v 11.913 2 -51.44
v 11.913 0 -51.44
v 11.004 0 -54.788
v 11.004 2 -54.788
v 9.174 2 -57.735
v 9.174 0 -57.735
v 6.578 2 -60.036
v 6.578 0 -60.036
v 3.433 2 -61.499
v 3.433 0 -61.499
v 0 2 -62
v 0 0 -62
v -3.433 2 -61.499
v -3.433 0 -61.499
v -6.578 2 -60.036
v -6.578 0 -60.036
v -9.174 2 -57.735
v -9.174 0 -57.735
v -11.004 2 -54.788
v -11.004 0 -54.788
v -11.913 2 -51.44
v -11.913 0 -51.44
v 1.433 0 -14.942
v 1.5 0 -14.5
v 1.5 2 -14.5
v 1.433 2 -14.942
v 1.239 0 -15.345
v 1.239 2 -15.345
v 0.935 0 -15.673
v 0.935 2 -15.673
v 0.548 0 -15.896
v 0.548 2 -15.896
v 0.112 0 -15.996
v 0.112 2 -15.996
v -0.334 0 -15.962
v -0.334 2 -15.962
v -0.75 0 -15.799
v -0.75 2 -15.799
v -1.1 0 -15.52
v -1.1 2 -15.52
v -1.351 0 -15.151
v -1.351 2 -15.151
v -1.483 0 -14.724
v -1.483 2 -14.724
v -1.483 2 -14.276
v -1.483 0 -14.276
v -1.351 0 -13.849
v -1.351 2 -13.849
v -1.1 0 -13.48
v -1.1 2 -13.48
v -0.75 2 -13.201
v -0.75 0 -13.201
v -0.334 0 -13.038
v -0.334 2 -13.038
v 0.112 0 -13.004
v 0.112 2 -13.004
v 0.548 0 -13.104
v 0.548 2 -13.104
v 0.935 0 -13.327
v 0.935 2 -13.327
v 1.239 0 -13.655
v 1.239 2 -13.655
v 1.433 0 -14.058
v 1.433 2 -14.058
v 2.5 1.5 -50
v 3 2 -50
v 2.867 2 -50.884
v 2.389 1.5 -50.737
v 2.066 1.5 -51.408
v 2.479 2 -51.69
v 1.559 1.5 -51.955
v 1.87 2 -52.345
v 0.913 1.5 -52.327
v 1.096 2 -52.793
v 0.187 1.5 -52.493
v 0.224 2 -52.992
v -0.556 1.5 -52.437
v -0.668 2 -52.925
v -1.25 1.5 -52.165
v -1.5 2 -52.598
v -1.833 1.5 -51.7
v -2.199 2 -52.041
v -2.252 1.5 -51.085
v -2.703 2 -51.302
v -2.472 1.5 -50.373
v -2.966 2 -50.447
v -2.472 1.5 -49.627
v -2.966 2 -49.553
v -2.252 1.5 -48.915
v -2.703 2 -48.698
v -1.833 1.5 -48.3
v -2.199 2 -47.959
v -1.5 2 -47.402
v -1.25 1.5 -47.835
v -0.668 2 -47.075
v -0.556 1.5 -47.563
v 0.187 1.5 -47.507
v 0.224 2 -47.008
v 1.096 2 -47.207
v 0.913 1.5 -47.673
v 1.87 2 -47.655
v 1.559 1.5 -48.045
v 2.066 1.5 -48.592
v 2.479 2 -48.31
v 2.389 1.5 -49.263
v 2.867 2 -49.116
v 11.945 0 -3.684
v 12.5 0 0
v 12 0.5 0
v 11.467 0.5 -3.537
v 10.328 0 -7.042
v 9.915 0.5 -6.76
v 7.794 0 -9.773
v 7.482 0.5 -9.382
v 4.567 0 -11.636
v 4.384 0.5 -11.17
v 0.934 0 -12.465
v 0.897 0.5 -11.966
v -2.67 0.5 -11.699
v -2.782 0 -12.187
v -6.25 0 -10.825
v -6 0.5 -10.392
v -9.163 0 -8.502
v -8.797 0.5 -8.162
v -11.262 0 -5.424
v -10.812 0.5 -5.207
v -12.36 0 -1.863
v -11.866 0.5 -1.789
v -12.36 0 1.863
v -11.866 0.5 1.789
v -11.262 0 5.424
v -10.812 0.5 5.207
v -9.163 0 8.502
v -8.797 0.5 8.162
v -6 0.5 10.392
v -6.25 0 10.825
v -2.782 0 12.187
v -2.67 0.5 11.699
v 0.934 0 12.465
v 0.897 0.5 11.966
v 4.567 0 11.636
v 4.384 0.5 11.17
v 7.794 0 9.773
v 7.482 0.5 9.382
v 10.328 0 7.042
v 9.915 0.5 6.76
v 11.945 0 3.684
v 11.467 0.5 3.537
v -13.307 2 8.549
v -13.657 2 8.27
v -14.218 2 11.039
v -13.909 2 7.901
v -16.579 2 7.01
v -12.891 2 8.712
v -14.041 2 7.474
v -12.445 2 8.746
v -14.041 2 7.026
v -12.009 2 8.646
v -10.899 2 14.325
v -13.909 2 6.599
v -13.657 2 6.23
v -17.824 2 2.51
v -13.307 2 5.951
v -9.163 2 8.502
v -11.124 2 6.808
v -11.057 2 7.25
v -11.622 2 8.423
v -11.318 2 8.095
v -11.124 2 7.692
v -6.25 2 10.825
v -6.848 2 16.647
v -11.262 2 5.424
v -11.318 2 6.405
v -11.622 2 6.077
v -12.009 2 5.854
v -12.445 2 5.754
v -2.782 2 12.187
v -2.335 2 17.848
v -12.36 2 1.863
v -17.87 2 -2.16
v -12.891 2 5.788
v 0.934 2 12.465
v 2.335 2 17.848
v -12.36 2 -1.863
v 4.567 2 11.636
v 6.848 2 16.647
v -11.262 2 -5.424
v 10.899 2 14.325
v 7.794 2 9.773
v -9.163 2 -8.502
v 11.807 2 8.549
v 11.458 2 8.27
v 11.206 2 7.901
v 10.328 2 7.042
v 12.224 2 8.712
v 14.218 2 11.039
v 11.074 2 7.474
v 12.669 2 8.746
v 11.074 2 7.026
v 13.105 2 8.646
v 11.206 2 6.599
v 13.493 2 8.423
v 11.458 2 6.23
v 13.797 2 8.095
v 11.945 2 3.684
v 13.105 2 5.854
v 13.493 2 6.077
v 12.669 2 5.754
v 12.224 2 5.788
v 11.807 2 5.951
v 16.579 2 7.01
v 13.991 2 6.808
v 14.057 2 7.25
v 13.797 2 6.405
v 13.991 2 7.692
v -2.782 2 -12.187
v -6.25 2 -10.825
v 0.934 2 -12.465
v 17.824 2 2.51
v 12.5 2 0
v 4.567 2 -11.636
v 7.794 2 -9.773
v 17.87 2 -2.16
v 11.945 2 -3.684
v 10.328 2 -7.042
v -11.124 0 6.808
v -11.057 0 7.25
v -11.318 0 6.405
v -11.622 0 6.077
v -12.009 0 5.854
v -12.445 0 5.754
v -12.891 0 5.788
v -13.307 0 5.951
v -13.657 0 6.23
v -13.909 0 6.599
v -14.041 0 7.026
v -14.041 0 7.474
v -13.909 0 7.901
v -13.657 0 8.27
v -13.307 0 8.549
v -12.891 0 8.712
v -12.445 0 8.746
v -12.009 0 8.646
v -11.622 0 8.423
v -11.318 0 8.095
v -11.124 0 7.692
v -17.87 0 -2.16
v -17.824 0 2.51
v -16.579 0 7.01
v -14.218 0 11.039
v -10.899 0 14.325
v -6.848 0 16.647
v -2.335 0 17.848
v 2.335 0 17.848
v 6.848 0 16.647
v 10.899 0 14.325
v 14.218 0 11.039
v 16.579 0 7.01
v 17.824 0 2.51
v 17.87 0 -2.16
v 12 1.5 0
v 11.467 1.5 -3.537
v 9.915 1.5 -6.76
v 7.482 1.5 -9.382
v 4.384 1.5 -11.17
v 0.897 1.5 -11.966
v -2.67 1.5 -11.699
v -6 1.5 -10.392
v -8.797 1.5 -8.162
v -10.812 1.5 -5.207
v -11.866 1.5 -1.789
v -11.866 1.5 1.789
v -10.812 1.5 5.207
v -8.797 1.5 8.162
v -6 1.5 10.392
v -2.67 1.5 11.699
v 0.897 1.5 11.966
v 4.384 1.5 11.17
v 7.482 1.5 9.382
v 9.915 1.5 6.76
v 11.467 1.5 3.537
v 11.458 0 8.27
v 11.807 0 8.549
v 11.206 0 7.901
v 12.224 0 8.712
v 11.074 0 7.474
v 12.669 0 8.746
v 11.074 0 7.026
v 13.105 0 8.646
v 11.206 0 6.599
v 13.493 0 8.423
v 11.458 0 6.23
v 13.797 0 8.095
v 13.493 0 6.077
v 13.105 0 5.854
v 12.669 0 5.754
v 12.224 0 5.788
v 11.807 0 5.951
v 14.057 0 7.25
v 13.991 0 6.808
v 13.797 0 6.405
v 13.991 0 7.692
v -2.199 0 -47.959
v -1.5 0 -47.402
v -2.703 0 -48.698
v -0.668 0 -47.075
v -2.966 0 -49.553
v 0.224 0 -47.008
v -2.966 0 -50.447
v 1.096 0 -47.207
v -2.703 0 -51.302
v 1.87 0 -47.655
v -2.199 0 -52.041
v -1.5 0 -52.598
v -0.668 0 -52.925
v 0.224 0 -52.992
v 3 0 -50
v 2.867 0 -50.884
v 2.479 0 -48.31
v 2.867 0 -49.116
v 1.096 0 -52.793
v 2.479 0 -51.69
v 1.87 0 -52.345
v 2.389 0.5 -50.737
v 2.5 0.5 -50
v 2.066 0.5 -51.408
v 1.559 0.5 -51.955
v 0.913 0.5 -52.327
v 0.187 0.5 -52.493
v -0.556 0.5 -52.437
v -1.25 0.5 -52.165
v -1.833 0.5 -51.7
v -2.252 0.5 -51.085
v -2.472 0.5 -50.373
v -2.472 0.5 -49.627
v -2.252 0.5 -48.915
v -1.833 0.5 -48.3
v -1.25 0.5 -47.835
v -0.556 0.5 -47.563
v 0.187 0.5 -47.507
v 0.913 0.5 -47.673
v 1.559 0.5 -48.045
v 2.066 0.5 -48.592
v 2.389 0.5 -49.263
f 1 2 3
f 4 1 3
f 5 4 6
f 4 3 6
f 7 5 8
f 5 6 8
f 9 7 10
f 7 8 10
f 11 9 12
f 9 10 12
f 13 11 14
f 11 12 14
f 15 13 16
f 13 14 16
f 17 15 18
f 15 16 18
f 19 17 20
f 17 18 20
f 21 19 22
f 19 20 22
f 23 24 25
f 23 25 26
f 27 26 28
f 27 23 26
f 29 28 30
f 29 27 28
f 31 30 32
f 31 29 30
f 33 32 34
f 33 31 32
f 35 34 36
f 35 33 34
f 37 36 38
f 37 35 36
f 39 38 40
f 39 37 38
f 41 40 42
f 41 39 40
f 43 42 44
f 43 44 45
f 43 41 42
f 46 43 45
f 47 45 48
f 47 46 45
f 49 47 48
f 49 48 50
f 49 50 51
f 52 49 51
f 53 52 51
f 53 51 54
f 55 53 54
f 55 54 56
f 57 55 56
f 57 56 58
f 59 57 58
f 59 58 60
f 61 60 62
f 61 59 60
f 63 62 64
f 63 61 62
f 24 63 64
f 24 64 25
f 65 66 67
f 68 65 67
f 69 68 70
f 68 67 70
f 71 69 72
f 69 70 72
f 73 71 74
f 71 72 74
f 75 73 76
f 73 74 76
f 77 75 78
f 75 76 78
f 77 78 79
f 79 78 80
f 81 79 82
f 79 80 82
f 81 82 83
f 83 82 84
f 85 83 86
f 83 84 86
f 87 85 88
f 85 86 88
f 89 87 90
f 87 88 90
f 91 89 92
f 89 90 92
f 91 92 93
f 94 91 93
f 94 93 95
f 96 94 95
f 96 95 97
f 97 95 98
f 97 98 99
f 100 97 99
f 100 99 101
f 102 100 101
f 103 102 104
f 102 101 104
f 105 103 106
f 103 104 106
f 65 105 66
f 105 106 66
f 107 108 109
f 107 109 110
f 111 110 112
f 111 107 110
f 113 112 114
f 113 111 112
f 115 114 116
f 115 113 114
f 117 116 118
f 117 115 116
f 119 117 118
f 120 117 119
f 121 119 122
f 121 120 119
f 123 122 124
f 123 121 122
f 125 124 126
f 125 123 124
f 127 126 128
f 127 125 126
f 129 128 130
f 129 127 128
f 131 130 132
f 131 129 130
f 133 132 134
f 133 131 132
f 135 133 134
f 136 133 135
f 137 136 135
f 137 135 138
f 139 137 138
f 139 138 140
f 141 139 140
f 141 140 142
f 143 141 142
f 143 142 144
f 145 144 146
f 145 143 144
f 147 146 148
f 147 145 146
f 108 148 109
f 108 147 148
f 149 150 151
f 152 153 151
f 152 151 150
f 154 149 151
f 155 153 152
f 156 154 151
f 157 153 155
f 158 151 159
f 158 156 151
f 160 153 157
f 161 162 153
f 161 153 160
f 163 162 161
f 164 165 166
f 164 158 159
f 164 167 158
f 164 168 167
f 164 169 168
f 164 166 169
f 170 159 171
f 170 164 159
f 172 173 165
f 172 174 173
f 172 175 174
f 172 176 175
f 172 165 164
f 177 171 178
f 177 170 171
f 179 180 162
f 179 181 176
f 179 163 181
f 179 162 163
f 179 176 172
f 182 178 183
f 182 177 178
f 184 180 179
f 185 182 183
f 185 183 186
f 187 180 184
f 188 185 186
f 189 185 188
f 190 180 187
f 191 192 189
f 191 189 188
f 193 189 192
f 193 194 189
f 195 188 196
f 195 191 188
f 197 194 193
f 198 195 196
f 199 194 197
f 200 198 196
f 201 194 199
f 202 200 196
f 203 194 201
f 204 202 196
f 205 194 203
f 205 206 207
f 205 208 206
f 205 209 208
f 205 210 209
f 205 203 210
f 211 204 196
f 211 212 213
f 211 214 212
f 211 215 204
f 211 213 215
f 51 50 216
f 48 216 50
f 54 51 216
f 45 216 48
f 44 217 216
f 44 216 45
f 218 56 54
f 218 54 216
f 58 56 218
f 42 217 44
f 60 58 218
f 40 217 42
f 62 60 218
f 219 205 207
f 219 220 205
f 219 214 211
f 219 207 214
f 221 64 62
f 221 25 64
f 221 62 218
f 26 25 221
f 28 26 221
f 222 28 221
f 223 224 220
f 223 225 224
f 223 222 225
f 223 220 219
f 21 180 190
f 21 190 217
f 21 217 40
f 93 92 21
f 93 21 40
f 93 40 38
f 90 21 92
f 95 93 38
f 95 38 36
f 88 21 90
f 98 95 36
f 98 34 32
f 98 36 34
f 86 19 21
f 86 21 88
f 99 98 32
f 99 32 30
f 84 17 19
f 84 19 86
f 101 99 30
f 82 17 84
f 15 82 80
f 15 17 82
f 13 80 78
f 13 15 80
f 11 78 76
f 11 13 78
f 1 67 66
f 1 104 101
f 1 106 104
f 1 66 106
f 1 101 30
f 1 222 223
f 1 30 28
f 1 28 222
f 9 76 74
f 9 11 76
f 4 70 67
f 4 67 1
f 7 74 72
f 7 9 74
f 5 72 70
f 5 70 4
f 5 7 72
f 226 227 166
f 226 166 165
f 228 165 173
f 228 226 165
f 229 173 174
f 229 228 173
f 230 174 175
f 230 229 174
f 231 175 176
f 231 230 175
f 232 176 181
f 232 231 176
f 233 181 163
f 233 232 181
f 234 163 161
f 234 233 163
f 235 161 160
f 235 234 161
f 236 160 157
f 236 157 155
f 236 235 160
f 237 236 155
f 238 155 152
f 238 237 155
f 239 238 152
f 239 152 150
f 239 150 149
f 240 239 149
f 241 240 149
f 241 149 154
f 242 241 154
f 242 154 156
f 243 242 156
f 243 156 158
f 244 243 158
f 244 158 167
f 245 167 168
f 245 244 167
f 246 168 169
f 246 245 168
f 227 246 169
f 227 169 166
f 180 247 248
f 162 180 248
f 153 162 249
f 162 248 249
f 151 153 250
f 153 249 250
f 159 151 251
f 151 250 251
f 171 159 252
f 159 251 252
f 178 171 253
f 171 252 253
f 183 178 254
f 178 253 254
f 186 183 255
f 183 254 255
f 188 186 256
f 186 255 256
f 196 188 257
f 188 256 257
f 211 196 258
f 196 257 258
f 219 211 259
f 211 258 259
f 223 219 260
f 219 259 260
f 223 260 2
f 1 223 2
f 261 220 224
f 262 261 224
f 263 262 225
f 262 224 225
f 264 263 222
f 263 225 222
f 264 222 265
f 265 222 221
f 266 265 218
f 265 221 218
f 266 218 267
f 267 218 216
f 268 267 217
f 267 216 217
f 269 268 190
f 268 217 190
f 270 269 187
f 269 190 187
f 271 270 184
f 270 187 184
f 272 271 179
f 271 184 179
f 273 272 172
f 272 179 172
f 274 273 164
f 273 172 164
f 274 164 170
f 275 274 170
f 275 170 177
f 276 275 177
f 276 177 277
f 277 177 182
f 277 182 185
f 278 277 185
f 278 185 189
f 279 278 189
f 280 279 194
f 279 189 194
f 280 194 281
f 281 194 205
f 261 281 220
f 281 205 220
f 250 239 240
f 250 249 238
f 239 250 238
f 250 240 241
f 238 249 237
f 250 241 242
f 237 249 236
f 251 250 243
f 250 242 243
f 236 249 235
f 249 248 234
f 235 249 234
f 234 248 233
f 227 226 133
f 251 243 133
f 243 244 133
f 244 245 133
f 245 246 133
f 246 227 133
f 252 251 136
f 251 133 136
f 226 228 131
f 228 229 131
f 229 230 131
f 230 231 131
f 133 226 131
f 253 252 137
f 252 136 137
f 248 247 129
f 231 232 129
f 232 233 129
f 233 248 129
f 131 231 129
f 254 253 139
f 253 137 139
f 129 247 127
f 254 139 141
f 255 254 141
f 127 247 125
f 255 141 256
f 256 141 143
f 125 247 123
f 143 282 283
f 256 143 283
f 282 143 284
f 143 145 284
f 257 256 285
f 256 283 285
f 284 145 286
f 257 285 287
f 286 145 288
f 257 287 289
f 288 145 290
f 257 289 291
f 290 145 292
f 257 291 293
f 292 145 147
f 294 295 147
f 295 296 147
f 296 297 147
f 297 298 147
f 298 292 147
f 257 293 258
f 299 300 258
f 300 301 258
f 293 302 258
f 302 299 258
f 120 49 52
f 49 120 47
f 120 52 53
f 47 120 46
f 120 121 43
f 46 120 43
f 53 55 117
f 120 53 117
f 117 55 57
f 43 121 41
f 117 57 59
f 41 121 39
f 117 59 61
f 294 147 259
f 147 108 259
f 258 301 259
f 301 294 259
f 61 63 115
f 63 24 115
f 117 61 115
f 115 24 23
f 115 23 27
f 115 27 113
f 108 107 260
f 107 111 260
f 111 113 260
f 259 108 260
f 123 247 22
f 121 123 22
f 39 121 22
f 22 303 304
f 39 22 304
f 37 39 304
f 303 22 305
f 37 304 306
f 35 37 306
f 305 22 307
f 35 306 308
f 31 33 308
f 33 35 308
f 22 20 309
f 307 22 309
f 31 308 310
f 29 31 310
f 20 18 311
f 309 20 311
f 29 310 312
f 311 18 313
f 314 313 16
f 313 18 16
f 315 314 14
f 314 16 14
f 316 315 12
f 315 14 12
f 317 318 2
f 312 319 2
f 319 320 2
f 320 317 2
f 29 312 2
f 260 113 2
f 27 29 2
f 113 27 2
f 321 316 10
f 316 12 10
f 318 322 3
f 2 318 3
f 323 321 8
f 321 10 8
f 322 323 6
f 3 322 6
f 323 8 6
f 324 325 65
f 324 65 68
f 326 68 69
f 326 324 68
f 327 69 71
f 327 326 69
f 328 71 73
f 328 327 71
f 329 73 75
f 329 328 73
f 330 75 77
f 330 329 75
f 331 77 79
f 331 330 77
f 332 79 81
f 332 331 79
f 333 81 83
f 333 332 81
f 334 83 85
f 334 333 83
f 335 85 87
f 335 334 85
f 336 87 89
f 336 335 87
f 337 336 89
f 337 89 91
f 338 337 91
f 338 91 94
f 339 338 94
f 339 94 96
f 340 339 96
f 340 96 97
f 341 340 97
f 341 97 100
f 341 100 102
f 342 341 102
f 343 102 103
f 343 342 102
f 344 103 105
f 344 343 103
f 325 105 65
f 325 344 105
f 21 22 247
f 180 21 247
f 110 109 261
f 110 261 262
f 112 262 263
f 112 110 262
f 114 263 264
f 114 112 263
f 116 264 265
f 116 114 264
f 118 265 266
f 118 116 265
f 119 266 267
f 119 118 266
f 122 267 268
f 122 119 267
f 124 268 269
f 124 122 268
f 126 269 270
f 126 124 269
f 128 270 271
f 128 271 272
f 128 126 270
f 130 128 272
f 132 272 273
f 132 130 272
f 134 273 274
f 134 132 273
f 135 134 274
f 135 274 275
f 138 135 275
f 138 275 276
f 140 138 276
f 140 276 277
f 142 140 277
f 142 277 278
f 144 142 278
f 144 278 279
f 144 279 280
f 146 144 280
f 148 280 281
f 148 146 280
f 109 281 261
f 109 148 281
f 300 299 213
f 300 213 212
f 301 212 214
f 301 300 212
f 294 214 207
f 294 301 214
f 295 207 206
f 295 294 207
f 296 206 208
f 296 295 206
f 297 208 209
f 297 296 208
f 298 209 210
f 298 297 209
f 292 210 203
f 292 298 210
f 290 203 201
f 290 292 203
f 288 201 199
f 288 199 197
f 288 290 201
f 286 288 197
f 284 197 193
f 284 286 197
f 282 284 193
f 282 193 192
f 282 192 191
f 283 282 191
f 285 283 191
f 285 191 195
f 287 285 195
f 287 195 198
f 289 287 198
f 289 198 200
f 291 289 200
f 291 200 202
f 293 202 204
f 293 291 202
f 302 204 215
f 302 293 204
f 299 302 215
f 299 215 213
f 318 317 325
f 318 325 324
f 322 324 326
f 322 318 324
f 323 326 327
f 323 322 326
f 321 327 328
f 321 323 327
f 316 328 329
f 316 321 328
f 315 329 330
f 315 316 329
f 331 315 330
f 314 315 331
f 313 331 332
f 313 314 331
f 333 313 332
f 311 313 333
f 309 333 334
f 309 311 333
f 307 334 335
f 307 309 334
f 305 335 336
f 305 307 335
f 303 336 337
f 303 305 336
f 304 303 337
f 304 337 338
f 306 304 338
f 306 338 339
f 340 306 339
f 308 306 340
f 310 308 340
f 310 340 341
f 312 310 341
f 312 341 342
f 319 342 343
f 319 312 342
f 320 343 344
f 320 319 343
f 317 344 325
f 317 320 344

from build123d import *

# Parameters (mm, degrees)
ESQUISSE1_R      = 12
ESQUISSE1_R_2    = 2.5
ESQUISSE1_R_3    = 1.5
EXTRUSION1_DEPTH = 2
CHANFREIN1_SIZE  = 0.5


with BuildPart() as part:
    # Esquisse1 → Extrusion1 (new body)
    with BuildSketch(Plane(origin=(0, 0, 0), x_dir=(1, 0, 0), z_dir=(0, 1, 0))):
        with BuildLine():
            Line((-11.9132867, 51.44), (-17.86993005, 2.16))
            ThreePointArc((-17.86993005, 2.16), (0, -18), (17.86993005, 2.16))
            Line((17.86993005, 2.16), (11.9132867, 51.44))
            ThreePointArc((11.9132867, 51.44), (0, 62), (-11.9132867, 51.44))
        make_face()
        Circle(ESQUISSE1_R, mode=Mode.SUBTRACT)
        with Locations((0, 50)):
            Circle(ESQUISSE1_R_2, mode=Mode.SUBTRACT)
        with Locations((-12.557368355, -7.25)):
            Circle(ESQUISSE1_R_3, mode=Mode.SUBTRACT)
        with Locations((12.557368355, -7.25)):
            Circle(ESQUISSE1_R_3, mode=Mode.SUBTRACT)
        with Locations((0, 14.5)):
            Circle(ESQUISSE1_R_3, mode=Mode.SUBTRACT)
    extrude(amount=EXTRUSION1_DEPTH)

    # Chanfrein1
    chanfrein1_edges = [part.edges().sort_by_distance(p)[0] for p in [
        (-12, 0, 0),
        (-12, 2, 0),
        (-2.5, 0, -50),
        (-2.5, 2, -50),
    ]]
    chamfer(chanfrein1_edges, length=CHANFREIN1_SIZE)


solid = part.part
